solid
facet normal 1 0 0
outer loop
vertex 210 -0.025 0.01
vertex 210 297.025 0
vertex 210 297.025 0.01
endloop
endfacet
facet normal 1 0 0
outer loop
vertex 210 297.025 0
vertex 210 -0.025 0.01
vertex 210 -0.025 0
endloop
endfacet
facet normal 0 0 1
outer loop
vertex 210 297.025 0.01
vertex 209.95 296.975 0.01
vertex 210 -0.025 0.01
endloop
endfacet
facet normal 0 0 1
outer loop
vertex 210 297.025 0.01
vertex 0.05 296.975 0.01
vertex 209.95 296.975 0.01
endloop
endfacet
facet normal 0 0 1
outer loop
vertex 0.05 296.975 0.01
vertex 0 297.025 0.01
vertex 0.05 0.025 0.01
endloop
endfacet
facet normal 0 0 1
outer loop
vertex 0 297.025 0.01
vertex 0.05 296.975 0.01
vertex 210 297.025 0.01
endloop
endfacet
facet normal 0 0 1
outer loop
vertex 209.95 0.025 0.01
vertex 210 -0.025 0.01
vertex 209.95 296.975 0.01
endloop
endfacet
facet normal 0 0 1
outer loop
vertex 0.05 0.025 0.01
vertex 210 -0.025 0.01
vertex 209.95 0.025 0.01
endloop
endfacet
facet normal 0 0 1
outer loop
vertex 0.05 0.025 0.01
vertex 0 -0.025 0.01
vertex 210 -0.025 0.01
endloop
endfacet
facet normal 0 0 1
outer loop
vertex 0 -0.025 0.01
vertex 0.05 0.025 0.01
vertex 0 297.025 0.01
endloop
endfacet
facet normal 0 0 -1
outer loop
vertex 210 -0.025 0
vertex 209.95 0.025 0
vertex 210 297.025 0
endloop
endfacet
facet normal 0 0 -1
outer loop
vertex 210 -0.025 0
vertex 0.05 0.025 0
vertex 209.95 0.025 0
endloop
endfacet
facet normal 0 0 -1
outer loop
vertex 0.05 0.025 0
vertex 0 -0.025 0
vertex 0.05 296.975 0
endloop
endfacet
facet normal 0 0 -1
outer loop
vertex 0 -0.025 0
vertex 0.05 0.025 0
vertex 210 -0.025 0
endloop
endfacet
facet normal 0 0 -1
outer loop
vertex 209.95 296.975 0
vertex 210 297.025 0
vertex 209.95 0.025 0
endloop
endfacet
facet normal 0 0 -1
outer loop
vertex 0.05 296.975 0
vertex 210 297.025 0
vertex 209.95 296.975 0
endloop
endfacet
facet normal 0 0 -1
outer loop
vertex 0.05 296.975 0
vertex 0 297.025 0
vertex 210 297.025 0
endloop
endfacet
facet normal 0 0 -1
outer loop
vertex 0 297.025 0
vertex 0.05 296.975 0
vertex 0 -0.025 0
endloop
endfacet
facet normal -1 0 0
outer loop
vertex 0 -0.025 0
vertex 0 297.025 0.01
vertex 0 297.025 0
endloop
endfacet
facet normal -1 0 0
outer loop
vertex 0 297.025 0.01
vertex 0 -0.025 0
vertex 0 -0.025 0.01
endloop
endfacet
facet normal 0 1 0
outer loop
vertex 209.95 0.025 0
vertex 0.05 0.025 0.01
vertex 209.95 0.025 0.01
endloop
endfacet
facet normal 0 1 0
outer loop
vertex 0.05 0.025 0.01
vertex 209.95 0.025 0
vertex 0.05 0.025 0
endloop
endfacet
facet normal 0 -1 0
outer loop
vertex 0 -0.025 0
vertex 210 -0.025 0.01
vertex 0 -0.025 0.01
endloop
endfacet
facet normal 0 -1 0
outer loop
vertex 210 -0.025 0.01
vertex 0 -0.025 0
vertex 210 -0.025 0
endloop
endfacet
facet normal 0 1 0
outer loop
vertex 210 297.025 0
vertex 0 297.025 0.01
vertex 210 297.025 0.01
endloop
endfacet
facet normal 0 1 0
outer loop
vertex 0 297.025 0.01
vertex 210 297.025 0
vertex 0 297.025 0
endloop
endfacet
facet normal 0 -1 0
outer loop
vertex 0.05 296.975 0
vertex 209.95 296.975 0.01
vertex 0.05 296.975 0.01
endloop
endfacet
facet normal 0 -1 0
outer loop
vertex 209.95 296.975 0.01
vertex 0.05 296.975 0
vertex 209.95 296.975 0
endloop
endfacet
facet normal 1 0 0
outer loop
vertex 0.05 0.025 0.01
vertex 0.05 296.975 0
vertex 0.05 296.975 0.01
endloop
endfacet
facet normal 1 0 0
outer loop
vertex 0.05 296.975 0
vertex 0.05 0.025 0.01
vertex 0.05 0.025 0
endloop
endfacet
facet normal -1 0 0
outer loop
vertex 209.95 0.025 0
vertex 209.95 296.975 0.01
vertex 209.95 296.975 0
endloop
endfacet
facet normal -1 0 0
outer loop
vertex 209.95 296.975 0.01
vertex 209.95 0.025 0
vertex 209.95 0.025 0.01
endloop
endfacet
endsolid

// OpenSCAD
// file: ../drawing_sheet_sizes.scad
// drawing_sheet_sizes.scad
sheet_sizes = [
    // ISO 216 (A-Series)
    ["A0", [841, 1189]],
    ["A1", [594, 841]],
    ["A2", [420, 594]],
    ["A3", [297, 420]],
    ["A4", [210, 297]],

    // ANSI Standard (U.S.)
    ["ANSI_A", [216, 279]], // 8.5 × 11 inches
    ["ANSI_B", [279, 432]], // 11 × 17 inches
    ["ANSI_C", [432, 559]], // 17 × 22 inches
    ["ANSI_D", [559, 864]], // 22 × 34 inches
    ["ANSI_E", [864, 1118]], // 34 × 44 inches

    // Architectural Sizes (U.S.)
    ["ARCH_A", [229, 305]], // 9 × 12 inches
    ["ARCH_B", [305, 457]], // 12 × 18 inches
    ["ARCH_C", [457, 610]], // 18 × 24 inches
    ["ARCH_D", [610, 914]], // 24 × 36 inches
    ["ARCH_E", [914, 1219]], // 36 × 48 inches

    // ASME Y14.1 (Engineering Drawings)
    ["ENG_A", [216, 279]], // Same as ANSI A
    ["ENG_B", [279, 432]], // Same as ANSI B
    ["ENG_C", [432, 559]], // Same as ANSI C
    ["ENG_D", [559, 864]], // Same as ANSI D
    ["ENG_E", [864, 1118]], // Same as ANSI E

    // JIS B-Series (Japan)
    ["B0", [1030, 1456]],
    ["B1", [728, 1030]],
    ["B2", [515, 728]],
    ["B3", [364, 515]],
    ["B4", [257, 364]],
];
// file: ../src/dd_titleblock.scad
/**
 * @file dd_titleblock.scad
 * @brief Functions for creating title blocks on drawing sheets.
 * @details This file contains functions for creating title blocks on drawing sheets. The titleblock function creates a
 * title block with lines, descriptions, and details based on the given parameters.
 * @copyright (c) 2021 Don Smiley, (c) 2025 Cameron K. Brooks
 */

/*
 * titleblock(lines, descs, details, color, text_color)
 * Creates a title block for a drawing sheet, including lines, descriptions, and details.
 * Parameters:
 * - lines: Array defining the lines in the title block with format:
 *           [[startx, starty, orientation, length, width], ...]
 *           - orientation: Use DIM_HORZ or DIM_VERT for horizontal/vertical lines.
 *           - width: Factor to scale the line width beyond DIM_LINE_WIDTH.
 * - descs: Array defining descriptive text blocks with format:
 *           [[startx, starty, orientation, text, size], ...]
 *           - size: Factor to scale font size beyond DIM_FONTSCALE.
 * - details: Array defining part-specific details with format:
 *           [[startx, starty, orientation, text, size], ...]
 * - color: Line color.
 * - text_color: Text color.
 * Behavior:
 * - Draws lines and places text (descriptions and details) at specified positions.
 * - Handles horizontal and vertical orientations for text and lines.
 */
module titleblock(lines, descs, details, color = DEF_LINE_COLOR, text_color = DEF_TEXT_COLOR) {
    DIM_FONTSCALE = DIM_LINE_WIDTH * 0.7;

    for (line = lines)
    {
        color(color) translate([line[0] * DIM_LINE_WIDTH, line[1] * DIM_LINE_WIDTH, 0]) if (line[2] == DIM_VERT) {
                // a vertical line runs down from its start point, and line() draws upward
                translate([0, -line[3] * DIM_LINE_WIDTH, 0])
                    line(length=line[3] * DIM_LINE_WIDTH, width=DIM_LINE_WIDTH * line[4], vert=true);
            } else {
                line(length=(line[3] + 1) * DIM_LINE_WIDTH, width=DIM_LINE_WIDTH * line[4]);
            }
    }

    color(text_color) {
        for (line = descs)
        {
            translate([line[0] * DIM_LINE_WIDTH, line[1] * DIM_LINE_WIDTH, 0]) if (line[2] == DIM_VERT) {
                rotate([0, 0, 90])
                    scale([DIM_FONTSCALE * line[4], DIM_FONTSCALE * line[4], DIM_FONTSCALE * line[4]]) text(line[3]);
            } else {
                scale([DIM_FONTSCALE * line[4], DIM_FONTSCALE * line[4], DIM_FONTSCALE * line[4]]) text(line[3]);
            }
        }

        for (line = details)
        {
            translate([line[0] * DIM_LINE_WIDTH, line[1] * DIM_LINE_WIDTH, 0]) if (line[2] == DIM_VERT) {
                rotate([0, 0, 90])
                    scale([DIM_FONTSCALE * line[4], DIM_FONTSCALE * line[4], DIM_FONTSCALE * line[4]]) text(line[3]);
            } else {
                scale([DIM_FONTSCALE * line[4], DIM_FONTSCALE * line[4], DIM_FONTSCALE * line[4]]) text(line[3]);
            }
        }
    }
}
// file: ../src/dd_sheet.scad
/**
 * @file dd_sheet.scad
 * @brief Functions for drawing sheets from standard sizes and grid patterns.
 * @details This file contains functions for drawing sheets with standard sizes and grid patterns. The draw_sheet
 * function can draw a sheet boundary based on given dimensions or a standard sheet symbol with a grid or dot pattern.
 * @copyright (c) 2025 Cameron K. Brooks, (c) 2021 Don Smiley
 */

include <../drawing_sheet_sizes.scad>;

/*
 * draw_sheet(length, height, sheet_symbol, grid_type, line_width, color)
 * Draws a sheet boundary based on given dimensions or a standard sheet symbol and adds a grid or dot pattern if
 * specified. Parameters:
 * - length: Length of the sheet (overridden if sheet_symbol is provided).
 * - height: Height of the sheet (overridden if sheet_symbol is provided).
 * - sheet_symbol: Standard sheet size identifier (e.g., "A4", "ANSI_B").
 * - grid_type: "None", "Dot", or "Grid" to specify the background pattern.
 * - line_width: Thickness of the sheet boundary lines.
 * - color: Optional parameter to set the frame's color.
 */
module draw_sheet(
    length = undef,
    height = undef,
    sheet_symbol = undef,
    line_width = DIM_LINE_WIDTH * 2,
    line_height = DIM_LINE_HEIGHT,
    grid_type = "None",
    grid_dim = DIM_GRID_SPACING,
    grid_line_width = DIM_LINE_WIDTH,
    color = DEF_LINE_COLOR
) {
    // If a sheet symbol is provided, it overrides length and height using the sheet_sizes array.
    // An assignment inside an if block is local to that block, so the size is resolved here.
    matches = is_undef(sheet_symbol) ? [] : [for (sheet = sheet_sizes) if (sheet[0] == sheet_symbol) sheet[1]];
    sheet_length = len(matches) > 0 ? matches[0][0] : length;
    sheet_height = len(matches) > 0 ? matches[0][1] : height;

    if (!is_undef(sheet_symbol)) {
        echo("Looking for sheet symbol: ", sheet_symbol);

        if (len(matches) > 0) {
            echo("Match found for sheet symbol: ", sheet_symbol, " Dimensions: ", matches[0]);
        } else {
            echo("Warning: Sheet symbol '", sheet_symbol, "' not found.");
        }
    }

    // Proceed only if length and height are defined
    if (!is_undef(sheet_length) && !is_undef(sheet_height)) {
        // Draw the grid or dots before drawing the frame to ensure it's in the background
        draw_frame(sheet_length, sheet_height, line_width, line_height, color);
        translate([0, 0, -DIM_LINE_WIDTH])
            draw_grid(sheet_length, sheet_height, grid_type, grid_dim, grid_line_width, line_height, "lightgray");
    } else {
        echo("Warning: Invalid dimensions. Frame not drawn.");
    }
}

module draw_frame(length, height, line_width = DIM_LINE_WIDTH, line_height = DIM_LINE_HEIGHT, color = DEF_LINE_COLOR) {
    /*
     * draw_frame(length, height, line_width, color)
     * Draws the rectangular frame of a sheet with specified dimensions and line width.
     * Parameters:
     * - length: Length of the sheet frame.
     * - height: Height of the sheet frame.
     * - line_width: Thickness of the frame lines.
     * - color: Optional parameter to set the frame's color.
     * Behavior:
     * - Creates a rectangular frame with horizontal and vertical lines.
     */
    color(color) {
        // Bottom horizontal line
        line(length=length, width=line_width, height=line_height);

        // Top horizontal line
        translate([0, height, 0]) line(length=length, width=line_width, height=line_height);

        // Left vertical line
        translate([line_width / 2, line_width / 2, 0])
            line(length=height - line_width, width=line_width, height=line_height, vert=true);

        // Right vertical line
        translate([length - line_width / 2, line_width / 2, 0])
            line(length=height - line_width, width=line_width, height=line_height, vert=true);
    }
}

module draw_grid(
    length,
    height,
    type = "None",
    grid_spacing = DIM_GRID_SPACING,
    line_width = DIM_LINE_WIDTH / 2,
    line_height = DIM_LINE_HEIGHT,
    color = "lightgray"
) {
    /*
     * draw_grid(length, height, type, grid_spacing, line_width, color)
     * Adds a grid or dot pattern to the sheet.
     * Parameters:
     * - length: Length of the sheet.
     * - height: Height of the sheet.
     * - type: "None", "Dot", or "Grid" to specify the background pattern.
     * - grid_spacing: Distance between grid lines or dots.
     * - line_width: Thickness of grid lines (ignored for dots).
     * - color: Color of the grid lines or dots.
     */

    if (type == "Grid") {
        color(color) {
            // Draw vertical grid lines
            for (x = [0:grid_spacing:length])
            {
                translate([x, 0, 0]) line(length=height, width=line_width, height=line_height, vert=true);
            }

            // Draw horizontal grid lines
            for (y = [0:grid_spacing:height])
            {
                translate([0, y, 0]) line(
                        length=length, width=line_width, height=line_height,
                        left_arrow=false, right_arrow=false
                    );
            }
        }
    } else if (type == "Dot") {
        color(color) {
            // Define dot size
            dot_size = line_width; // You can adjust the dot size as needed

            for (x = [0:grid_spacing:length])
            {
                for (y = [0:grid_spacing:height])
                {
                    translate([x, y, 0]) sphere(r=dot_size, $fn=12);
                }
            }
        }
    } else {
        echo("No grid or dot pattern selected.");
    }
}
// file: ../dimdraft.scad
// ----- Variables -----
DOC_SCALING_FACTOR = is_undef(SCALING_FACTOR) ? 1 : SCALING_FACTOR;

// Line and text related constants

DIM_LINE_WIDTH_NOMINAL = 0.025; // Nominal line width
DIM_SPACE_NOMINAL = 0.1; // Nominal spacing value for line spacing adjustments
DIM_LINE_HEIGHT_NOMINAL = 0.01; // Nominal height of lines

DIM_LINE_WIDTH =
    is_undef(LINE_WIDTH) ? DIM_LINE_WIDTH_NOMINAL * DOC_SCALING_FACTOR : LINE_WIDTH; // Width of the dimension lines
DIM_LINE_HEIGHT =
    is_undef(HEIGHT) ? DIM_LINE_HEIGHT_NOMINAL * DOC_SCALING_FACTOR : HEIGHT; // Height of the dimension lines
DIM_SPACE =
    is_undef(SPACE) ? DIM_SPACE_NOMINAL * DOC_SCALING_FACTOR : SPACE; // Spacing value for line spacing adjustments

DEF_LINE_COLOR = is_undef(LINE_COLOR) ? "black" : LINE_COLOR; // Default line color
DEF_TEXT_COLOR = is_undef(TEXT_COLOR) ? "black" : TEXT_COLOR; // Default text color

// ----- Dependent Constants -----
// Hole center constant
DIM_HOLE_CENTER = DIM_LINE_WIDTH * 6; // Size of the cross within a circle
// Text is drawn at OpenSCAD's default size of 10 and scaled by DIM_FONTSCALE.
// Its height is 7 line widths unless TEXT_SIZE is set.
DIM_FONTSCALE = is_undef(TEXT_SIZE) ? DIM_LINE_WIDTH * 0.7 : TEXT_SIZE / 10;
DIM_TEXT_SIZE = DIM_FONTSCALE * 10; // Height of the text

DIM_GRID_SPACING = 50; // Default grid spacing value, standard for most drawings (i.e. ISO, ANSI, etc.)

// ----- Constants -----
// Dimension positioning constants
DIM_CENTER = 0;
DIM_LEFT = 1;
DIM_RIGHT = 2;
DIM_OUTSIDE = 3;

// Orientation constants
DIM_HORZ = 0;
DIM_VERT = 1;

// Corner positioning constants
DIM_UPPER_LEFT = 0;
DIM_UPPER_RIGHT = 1;
DIM_LOWER_LEFT = 2;
DIM_LOWER_RIGHT = 3;

// Offset value for hole length
ZFITE = 0.05; // Added to the hole length to extend past the surface of the cube

include <src/dd_dimlines.scad>;
include <src/dd_sheet.scad>;
include <src/dd_titleblock.scad>;
// main file
// draw_sheet with a standard sheet name must draw a frame of that size: A4 is 210 x 297.
// The frame is 0.05 wide, so its horizontal lines are 210 long and its vertical lines 297 - 0.05.
// expect: cube\(size = \[210, 0\.05, 0\.01\]
// expect: cube\(size = \[296\.95, 0\.05, 0\.01\]
// reject: Invalid dimensions
include <../dimdraft.scad>

draw_sheet(sheet_symbol="A4");
